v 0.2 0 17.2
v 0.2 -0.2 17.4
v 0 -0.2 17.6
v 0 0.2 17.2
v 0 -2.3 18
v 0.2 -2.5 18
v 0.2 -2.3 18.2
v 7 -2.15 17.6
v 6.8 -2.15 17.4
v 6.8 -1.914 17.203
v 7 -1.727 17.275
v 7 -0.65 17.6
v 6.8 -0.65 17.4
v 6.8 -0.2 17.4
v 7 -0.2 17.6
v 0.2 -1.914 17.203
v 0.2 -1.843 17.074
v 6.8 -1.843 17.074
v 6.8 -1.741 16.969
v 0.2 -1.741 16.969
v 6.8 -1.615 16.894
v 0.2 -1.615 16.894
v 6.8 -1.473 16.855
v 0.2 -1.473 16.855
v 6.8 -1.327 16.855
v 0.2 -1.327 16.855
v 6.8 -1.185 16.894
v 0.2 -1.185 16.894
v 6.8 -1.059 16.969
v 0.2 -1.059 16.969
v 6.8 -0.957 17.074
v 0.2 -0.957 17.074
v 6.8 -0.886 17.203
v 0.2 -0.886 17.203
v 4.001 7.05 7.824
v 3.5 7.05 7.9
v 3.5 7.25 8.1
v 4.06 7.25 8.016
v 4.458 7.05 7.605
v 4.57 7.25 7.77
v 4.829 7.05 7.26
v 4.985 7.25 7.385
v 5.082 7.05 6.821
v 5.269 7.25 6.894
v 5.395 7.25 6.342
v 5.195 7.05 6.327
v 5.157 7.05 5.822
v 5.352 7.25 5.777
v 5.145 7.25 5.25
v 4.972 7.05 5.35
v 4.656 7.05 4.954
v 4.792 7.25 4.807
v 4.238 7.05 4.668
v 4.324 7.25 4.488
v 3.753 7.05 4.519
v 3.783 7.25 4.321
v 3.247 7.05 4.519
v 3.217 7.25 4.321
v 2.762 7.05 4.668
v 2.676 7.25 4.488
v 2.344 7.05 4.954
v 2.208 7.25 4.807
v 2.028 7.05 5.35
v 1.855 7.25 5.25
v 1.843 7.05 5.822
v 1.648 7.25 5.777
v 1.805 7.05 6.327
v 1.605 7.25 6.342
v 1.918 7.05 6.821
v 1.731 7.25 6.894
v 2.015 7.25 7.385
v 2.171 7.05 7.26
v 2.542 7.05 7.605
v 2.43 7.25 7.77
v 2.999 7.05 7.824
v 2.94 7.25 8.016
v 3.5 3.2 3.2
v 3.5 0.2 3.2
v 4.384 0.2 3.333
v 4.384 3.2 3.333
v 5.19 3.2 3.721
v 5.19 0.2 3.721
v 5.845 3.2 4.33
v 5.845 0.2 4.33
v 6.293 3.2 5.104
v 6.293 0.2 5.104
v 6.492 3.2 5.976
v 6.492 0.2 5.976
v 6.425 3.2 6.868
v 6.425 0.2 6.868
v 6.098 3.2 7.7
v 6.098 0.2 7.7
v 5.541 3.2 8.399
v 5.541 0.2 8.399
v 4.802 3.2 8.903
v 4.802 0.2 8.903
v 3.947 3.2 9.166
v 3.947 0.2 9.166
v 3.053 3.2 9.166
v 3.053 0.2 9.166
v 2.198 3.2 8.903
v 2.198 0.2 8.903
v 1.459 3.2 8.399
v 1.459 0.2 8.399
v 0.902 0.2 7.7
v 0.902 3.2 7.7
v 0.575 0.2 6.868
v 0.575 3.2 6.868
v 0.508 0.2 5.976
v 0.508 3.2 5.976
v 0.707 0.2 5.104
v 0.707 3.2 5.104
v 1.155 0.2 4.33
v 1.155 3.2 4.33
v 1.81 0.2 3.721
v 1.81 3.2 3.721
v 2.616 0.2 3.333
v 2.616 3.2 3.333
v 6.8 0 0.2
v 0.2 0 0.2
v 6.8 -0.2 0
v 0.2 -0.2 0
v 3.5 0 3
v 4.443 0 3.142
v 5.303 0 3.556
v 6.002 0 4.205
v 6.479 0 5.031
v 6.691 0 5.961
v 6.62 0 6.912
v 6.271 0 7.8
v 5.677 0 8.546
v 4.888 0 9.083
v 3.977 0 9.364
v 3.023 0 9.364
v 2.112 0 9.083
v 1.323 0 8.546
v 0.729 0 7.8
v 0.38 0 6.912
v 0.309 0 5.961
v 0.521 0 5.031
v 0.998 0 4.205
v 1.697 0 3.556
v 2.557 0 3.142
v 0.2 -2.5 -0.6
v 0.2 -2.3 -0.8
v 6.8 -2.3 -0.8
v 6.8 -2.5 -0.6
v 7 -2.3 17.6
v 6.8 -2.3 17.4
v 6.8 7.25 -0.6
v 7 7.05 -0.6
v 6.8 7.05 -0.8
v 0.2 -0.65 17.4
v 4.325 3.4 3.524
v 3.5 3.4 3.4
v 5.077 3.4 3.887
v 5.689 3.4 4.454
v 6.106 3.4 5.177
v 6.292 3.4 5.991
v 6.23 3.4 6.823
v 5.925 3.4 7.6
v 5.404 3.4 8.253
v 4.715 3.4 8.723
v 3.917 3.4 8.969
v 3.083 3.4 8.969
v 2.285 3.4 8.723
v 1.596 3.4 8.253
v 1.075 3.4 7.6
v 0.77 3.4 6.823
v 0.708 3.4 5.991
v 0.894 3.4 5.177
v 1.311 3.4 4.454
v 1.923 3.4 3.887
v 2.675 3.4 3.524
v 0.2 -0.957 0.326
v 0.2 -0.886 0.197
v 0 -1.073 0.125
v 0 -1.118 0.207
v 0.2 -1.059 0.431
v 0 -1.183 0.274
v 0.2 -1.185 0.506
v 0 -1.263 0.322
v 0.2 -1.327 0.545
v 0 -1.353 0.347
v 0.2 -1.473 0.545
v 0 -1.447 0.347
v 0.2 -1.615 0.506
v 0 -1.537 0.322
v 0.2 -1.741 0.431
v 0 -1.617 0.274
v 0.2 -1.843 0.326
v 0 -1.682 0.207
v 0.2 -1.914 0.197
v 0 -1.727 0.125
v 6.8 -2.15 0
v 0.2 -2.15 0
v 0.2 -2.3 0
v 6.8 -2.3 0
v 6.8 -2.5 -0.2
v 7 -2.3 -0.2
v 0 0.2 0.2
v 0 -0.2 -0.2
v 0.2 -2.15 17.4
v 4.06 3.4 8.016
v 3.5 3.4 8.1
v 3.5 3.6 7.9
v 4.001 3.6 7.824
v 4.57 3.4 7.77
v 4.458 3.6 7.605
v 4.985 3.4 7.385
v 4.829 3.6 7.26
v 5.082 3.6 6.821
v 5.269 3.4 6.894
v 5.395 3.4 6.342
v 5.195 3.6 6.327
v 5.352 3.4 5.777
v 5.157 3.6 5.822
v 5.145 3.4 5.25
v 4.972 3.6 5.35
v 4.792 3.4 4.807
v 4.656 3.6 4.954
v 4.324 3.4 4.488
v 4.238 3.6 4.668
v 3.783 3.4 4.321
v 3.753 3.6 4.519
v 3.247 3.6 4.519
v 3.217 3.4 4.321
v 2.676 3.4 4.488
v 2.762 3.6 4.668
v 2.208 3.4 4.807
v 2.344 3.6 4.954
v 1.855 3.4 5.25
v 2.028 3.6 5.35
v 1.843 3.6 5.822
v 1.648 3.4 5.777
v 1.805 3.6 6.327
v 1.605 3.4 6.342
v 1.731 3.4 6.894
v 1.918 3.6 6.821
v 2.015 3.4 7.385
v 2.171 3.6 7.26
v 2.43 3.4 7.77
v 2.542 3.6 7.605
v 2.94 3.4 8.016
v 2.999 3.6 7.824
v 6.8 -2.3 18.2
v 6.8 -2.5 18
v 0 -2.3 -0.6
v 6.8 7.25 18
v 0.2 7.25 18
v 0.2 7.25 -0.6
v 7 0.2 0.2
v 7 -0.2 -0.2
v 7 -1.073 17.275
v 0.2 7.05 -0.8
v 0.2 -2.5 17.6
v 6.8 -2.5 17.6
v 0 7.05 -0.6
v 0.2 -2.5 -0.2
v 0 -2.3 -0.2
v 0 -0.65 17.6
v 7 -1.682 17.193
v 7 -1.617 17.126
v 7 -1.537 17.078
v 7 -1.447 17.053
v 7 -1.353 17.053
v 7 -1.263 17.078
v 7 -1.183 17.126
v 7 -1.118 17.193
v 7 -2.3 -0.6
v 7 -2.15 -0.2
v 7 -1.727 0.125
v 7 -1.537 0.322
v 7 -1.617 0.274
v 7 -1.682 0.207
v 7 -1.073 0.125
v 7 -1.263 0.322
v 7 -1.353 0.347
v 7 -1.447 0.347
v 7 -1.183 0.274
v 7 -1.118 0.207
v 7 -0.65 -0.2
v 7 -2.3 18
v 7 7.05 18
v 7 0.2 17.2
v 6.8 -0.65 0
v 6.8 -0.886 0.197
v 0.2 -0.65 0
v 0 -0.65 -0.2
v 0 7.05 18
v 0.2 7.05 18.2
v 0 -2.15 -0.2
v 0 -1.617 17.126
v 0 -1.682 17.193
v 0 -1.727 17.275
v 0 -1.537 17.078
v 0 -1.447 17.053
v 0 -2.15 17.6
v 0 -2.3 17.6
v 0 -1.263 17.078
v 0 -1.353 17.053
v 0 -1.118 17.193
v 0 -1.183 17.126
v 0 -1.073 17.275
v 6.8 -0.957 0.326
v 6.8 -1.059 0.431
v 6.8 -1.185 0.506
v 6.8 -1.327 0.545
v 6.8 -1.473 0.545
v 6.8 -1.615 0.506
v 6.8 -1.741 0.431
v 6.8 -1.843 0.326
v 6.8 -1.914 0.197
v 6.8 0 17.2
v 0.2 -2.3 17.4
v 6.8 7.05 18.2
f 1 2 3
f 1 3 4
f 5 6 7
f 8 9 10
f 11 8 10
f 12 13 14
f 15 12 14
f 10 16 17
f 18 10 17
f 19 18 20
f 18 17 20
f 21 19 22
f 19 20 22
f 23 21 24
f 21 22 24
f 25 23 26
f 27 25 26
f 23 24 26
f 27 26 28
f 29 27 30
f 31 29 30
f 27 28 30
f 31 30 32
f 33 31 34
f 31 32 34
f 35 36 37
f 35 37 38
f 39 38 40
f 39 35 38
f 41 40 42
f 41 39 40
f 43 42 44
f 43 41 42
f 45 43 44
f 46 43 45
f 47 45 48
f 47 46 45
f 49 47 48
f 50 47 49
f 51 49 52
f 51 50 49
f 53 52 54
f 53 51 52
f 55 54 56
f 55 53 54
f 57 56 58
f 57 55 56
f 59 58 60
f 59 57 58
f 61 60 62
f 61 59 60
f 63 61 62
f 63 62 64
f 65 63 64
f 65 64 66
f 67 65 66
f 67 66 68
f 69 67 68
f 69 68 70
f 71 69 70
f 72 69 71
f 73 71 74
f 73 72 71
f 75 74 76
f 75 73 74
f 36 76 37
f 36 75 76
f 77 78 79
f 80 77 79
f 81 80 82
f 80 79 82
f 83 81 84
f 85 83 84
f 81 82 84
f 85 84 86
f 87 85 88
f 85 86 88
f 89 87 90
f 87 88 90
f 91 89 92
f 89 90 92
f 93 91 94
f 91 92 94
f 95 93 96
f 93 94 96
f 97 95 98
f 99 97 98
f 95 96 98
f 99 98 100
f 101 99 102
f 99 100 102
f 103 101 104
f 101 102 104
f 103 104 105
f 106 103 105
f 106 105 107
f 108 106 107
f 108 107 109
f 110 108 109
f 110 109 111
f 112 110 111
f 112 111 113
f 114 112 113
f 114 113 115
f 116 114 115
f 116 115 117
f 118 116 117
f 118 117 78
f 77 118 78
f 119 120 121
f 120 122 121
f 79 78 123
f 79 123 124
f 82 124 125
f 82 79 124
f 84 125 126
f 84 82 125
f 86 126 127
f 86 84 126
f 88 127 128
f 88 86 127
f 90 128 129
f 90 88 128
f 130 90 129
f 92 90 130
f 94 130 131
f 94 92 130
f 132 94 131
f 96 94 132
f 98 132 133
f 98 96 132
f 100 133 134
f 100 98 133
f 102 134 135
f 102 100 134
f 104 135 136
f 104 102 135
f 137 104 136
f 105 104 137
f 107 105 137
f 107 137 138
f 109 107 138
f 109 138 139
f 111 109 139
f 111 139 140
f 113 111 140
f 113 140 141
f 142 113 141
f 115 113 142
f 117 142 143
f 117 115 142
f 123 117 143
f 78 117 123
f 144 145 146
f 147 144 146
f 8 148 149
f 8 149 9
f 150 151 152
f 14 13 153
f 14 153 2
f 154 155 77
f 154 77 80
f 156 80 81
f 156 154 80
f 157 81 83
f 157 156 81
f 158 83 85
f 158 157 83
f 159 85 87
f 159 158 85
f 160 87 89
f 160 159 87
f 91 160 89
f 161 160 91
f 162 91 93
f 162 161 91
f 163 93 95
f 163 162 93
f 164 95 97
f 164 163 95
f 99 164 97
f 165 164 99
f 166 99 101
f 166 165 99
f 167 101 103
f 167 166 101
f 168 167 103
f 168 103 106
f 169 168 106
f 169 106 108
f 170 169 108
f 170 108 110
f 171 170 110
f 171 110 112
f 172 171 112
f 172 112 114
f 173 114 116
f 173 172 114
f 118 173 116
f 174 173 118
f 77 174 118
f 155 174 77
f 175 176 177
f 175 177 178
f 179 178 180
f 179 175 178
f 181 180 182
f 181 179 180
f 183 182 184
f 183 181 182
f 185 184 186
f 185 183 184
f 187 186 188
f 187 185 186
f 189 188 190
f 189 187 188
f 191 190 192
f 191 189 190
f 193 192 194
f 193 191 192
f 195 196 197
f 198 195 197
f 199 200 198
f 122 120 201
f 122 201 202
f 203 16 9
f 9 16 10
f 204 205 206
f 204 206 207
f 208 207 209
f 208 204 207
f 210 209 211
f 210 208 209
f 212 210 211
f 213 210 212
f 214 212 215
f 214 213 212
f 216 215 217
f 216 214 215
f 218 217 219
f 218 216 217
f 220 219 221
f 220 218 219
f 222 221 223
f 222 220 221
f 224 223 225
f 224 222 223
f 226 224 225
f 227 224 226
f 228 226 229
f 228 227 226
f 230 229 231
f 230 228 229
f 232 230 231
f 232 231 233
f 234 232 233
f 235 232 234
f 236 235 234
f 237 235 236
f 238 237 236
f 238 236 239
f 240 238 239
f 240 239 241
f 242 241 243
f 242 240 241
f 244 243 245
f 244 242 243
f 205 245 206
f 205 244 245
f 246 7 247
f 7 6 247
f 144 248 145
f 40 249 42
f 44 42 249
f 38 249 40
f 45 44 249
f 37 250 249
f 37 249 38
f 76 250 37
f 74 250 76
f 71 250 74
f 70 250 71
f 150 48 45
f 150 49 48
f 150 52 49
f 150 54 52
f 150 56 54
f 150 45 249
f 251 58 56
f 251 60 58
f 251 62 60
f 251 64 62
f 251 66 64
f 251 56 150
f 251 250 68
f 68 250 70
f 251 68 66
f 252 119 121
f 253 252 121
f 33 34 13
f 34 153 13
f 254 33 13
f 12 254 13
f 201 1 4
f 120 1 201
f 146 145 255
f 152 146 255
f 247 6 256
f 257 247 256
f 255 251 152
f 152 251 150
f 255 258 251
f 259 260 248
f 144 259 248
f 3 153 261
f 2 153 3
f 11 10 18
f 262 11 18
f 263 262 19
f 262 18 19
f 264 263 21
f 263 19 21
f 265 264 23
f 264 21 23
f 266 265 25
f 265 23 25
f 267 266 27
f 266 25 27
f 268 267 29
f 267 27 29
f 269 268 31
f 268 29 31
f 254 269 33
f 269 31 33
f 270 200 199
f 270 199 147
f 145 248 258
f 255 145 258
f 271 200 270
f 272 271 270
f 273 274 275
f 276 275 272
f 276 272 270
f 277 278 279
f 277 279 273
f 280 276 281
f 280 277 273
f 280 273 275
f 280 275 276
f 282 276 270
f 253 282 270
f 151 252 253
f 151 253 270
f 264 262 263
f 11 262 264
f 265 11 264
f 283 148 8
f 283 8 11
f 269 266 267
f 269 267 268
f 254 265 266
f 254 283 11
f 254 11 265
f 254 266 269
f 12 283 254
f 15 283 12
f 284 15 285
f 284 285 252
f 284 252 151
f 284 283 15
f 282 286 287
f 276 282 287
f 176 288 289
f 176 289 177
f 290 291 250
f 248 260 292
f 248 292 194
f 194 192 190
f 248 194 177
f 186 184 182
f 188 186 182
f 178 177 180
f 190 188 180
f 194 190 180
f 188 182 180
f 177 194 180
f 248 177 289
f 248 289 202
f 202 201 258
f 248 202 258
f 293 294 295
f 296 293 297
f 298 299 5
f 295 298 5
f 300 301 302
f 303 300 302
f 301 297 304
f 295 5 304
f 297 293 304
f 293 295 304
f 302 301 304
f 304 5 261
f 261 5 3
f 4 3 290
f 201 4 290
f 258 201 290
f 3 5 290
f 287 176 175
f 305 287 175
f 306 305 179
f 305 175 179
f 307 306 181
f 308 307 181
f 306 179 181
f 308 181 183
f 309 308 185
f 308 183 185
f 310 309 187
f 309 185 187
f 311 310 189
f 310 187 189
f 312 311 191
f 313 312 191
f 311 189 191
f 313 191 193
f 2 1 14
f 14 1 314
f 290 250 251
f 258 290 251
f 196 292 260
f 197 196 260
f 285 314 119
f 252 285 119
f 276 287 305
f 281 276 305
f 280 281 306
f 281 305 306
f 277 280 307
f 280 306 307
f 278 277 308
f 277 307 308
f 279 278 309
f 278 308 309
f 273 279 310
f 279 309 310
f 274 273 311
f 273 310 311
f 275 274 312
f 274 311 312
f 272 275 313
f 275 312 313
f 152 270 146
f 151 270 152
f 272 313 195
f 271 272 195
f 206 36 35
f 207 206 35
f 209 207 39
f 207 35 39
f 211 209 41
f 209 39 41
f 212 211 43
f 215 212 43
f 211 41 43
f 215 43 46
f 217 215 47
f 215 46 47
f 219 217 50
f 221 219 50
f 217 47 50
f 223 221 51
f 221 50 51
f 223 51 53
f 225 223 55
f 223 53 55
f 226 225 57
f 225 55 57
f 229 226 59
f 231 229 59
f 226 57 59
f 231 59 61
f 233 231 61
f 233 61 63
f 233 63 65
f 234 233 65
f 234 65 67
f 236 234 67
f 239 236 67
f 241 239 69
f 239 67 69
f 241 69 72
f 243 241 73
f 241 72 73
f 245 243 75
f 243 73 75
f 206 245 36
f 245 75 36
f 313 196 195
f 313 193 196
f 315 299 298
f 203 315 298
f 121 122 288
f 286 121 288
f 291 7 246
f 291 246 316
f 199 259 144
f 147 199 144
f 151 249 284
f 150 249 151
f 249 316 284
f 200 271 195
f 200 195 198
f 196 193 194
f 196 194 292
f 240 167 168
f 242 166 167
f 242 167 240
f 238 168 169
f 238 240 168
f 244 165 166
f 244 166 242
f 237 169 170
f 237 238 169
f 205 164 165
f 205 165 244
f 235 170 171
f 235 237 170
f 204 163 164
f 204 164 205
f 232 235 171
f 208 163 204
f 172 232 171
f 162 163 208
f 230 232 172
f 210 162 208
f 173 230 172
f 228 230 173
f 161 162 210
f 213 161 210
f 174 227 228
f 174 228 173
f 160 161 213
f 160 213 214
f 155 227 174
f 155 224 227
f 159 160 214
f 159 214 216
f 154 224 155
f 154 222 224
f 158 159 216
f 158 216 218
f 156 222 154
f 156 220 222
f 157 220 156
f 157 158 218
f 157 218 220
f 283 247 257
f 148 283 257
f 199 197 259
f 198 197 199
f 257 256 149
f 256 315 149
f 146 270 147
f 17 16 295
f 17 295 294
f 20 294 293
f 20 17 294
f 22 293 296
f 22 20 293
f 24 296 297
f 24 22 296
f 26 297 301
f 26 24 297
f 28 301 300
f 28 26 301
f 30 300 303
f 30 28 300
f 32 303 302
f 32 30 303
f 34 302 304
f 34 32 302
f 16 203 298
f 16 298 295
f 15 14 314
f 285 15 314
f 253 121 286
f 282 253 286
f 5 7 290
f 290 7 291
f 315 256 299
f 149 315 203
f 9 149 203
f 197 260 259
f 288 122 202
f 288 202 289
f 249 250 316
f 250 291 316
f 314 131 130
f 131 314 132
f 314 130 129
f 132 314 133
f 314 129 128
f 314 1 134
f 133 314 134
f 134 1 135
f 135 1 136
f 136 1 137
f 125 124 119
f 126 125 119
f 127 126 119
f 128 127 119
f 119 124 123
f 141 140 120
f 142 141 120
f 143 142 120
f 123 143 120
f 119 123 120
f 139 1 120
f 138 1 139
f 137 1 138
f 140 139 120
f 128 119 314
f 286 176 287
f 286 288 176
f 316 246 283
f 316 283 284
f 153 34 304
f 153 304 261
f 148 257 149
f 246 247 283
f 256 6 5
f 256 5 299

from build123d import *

# Parameters (mm, degrees)
PAD_DEPTH        = 7
HOLE_D           = 3.4
HOLE_CBORE_D     = 6
HOLE_CBORE_DEPTH = 3.4
CHAMFER_SIZE     = 0.2


with BuildPart() as part:
    # Sketch → Pad (new body)
    with BuildSketch(Plane.YZ):
        with BuildLine():
            Line((-2.5, 0), (-2.5, -0.8))
            Line((-2.5, -0.8), (7.25, -0.8))
            Line((7.25, 18.2), (7.25, -0.8))
            Line((-2.5, 18.2), (7.25, 18.2))
            Line((-2.5, 18.2), (-2.5, 17.4))
            Line((-2.5, 17.4), (-1.95, 17.4))
            ThreePointArc((-1.95, 17.4), (-1.4, 16.85), (-0.85, 17.4))
            Line((-0.85, 17.4), (0, 17.4))
            Line((0, 17.4), (0, 0))
            Line((0, 0), (-0.85, 0))
            ThreePointArc((-0.85, 0), (-1.4, 0.55), (-1.95, 0))
            Line((-1.95, 0), (-2.5, 0))
        make_face()
    extrude(amount=PAD_DEPTH)

    # Hole (through all)
    with Locations(Plane(origin=(0, 0, 0), x_dir=(0, 0, -1), z_dir=(0, -1, 0))):
        with Locations((-6.2, 3.5)):
            CounterBoreHole(HOLE_D / 2, HOLE_CBORE_D / 2, HOLE_CBORE_DEPTH)

    # Chamfer
    chamfer_edges = [part.edges().sort_by_distance(p)[0] for p in [
        (3.5, -2.5, 18.2),
        (3.5, -2.5, 17.4),
        (0, -2.5, 17.8),
        (7, -2.5, 17.8),
        (3.5, 7.25, 18.2),
        (0, 2.375, 18.2),
        (7, 2.375, 18.2),
        (3.5, -1.95, 17.4),
        (0, -2.225, 17.4),
        (7, -2.225, 17.4),
        (0, -1.4, 16.85),
        (0, -0.425, 17.4),
        (0, 0, 8.7),
        (0, -0.425, 0),
        (0, -1.4, 0.55),
        (0, -2.225, 0),
        (0, -2.5, -0.4),
        (0, 2.375, -0.8),
        (0, 7.25, 8.7),
        (7, -1.4, 16.85),
        (7, -0.425, 17.4),
        (7, 0, 8.7),
        (7, -0.425, 0),
        (7, -1.4, 0.55),
        (7, -2.225, 0),
        (7, -2.5, -0.4),
        (7, 2.375, -0.8),
        (7, 7.25, 8.7),
        (3.5, 7.25, -0.8),
        (1.8, 7.25, 6.2),
        (3.5, -0.85, 17.4),
        (3.5, 0, 17.4),
        (3.5, 0, 0),
        (0.5, 0, 6.2),
        (3.5, -0.85, 0),
        (3.5, -1.95, 0),
        (3.5, -2.5, 0),
        (3.5, -2.5, -0.8),
        (5.2, 5.325, 6.2),
        (1.8, 3.4, 6.2),
        (0.5, 3.4, 6.2),
        (6.5, 1.7, 6.2),
    ]]
    chamfer(chamfer_edges, length=CHAMFER_SIZE)


solid = part.part
